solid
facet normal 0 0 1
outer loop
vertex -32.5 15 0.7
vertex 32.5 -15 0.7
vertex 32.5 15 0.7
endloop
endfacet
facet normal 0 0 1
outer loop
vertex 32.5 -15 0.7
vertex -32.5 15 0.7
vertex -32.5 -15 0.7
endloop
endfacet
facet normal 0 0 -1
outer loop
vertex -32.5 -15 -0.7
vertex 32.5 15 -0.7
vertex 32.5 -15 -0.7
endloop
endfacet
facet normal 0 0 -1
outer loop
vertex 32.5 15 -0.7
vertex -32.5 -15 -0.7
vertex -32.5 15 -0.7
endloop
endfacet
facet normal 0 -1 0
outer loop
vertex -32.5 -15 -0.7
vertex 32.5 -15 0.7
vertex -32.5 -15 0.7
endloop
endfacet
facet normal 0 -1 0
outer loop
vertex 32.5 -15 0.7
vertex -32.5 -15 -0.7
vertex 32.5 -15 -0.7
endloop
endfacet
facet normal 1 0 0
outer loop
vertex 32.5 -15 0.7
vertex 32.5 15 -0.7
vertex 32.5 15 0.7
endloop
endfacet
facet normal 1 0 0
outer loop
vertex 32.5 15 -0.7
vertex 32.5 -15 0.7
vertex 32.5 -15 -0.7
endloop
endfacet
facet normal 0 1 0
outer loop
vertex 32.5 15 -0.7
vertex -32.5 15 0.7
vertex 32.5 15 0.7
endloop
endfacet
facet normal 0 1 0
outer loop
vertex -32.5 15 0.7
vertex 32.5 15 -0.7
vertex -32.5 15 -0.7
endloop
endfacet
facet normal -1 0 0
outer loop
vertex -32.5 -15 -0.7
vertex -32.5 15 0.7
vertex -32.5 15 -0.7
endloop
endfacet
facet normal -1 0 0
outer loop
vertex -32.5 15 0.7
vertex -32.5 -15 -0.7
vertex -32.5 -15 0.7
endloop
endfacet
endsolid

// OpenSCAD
$fn=64;

module sbc_board(length=65.0, width=30.0, thickness=1.4) {
    cube([length, width, thickness], center=true);
}

sbc_board();
